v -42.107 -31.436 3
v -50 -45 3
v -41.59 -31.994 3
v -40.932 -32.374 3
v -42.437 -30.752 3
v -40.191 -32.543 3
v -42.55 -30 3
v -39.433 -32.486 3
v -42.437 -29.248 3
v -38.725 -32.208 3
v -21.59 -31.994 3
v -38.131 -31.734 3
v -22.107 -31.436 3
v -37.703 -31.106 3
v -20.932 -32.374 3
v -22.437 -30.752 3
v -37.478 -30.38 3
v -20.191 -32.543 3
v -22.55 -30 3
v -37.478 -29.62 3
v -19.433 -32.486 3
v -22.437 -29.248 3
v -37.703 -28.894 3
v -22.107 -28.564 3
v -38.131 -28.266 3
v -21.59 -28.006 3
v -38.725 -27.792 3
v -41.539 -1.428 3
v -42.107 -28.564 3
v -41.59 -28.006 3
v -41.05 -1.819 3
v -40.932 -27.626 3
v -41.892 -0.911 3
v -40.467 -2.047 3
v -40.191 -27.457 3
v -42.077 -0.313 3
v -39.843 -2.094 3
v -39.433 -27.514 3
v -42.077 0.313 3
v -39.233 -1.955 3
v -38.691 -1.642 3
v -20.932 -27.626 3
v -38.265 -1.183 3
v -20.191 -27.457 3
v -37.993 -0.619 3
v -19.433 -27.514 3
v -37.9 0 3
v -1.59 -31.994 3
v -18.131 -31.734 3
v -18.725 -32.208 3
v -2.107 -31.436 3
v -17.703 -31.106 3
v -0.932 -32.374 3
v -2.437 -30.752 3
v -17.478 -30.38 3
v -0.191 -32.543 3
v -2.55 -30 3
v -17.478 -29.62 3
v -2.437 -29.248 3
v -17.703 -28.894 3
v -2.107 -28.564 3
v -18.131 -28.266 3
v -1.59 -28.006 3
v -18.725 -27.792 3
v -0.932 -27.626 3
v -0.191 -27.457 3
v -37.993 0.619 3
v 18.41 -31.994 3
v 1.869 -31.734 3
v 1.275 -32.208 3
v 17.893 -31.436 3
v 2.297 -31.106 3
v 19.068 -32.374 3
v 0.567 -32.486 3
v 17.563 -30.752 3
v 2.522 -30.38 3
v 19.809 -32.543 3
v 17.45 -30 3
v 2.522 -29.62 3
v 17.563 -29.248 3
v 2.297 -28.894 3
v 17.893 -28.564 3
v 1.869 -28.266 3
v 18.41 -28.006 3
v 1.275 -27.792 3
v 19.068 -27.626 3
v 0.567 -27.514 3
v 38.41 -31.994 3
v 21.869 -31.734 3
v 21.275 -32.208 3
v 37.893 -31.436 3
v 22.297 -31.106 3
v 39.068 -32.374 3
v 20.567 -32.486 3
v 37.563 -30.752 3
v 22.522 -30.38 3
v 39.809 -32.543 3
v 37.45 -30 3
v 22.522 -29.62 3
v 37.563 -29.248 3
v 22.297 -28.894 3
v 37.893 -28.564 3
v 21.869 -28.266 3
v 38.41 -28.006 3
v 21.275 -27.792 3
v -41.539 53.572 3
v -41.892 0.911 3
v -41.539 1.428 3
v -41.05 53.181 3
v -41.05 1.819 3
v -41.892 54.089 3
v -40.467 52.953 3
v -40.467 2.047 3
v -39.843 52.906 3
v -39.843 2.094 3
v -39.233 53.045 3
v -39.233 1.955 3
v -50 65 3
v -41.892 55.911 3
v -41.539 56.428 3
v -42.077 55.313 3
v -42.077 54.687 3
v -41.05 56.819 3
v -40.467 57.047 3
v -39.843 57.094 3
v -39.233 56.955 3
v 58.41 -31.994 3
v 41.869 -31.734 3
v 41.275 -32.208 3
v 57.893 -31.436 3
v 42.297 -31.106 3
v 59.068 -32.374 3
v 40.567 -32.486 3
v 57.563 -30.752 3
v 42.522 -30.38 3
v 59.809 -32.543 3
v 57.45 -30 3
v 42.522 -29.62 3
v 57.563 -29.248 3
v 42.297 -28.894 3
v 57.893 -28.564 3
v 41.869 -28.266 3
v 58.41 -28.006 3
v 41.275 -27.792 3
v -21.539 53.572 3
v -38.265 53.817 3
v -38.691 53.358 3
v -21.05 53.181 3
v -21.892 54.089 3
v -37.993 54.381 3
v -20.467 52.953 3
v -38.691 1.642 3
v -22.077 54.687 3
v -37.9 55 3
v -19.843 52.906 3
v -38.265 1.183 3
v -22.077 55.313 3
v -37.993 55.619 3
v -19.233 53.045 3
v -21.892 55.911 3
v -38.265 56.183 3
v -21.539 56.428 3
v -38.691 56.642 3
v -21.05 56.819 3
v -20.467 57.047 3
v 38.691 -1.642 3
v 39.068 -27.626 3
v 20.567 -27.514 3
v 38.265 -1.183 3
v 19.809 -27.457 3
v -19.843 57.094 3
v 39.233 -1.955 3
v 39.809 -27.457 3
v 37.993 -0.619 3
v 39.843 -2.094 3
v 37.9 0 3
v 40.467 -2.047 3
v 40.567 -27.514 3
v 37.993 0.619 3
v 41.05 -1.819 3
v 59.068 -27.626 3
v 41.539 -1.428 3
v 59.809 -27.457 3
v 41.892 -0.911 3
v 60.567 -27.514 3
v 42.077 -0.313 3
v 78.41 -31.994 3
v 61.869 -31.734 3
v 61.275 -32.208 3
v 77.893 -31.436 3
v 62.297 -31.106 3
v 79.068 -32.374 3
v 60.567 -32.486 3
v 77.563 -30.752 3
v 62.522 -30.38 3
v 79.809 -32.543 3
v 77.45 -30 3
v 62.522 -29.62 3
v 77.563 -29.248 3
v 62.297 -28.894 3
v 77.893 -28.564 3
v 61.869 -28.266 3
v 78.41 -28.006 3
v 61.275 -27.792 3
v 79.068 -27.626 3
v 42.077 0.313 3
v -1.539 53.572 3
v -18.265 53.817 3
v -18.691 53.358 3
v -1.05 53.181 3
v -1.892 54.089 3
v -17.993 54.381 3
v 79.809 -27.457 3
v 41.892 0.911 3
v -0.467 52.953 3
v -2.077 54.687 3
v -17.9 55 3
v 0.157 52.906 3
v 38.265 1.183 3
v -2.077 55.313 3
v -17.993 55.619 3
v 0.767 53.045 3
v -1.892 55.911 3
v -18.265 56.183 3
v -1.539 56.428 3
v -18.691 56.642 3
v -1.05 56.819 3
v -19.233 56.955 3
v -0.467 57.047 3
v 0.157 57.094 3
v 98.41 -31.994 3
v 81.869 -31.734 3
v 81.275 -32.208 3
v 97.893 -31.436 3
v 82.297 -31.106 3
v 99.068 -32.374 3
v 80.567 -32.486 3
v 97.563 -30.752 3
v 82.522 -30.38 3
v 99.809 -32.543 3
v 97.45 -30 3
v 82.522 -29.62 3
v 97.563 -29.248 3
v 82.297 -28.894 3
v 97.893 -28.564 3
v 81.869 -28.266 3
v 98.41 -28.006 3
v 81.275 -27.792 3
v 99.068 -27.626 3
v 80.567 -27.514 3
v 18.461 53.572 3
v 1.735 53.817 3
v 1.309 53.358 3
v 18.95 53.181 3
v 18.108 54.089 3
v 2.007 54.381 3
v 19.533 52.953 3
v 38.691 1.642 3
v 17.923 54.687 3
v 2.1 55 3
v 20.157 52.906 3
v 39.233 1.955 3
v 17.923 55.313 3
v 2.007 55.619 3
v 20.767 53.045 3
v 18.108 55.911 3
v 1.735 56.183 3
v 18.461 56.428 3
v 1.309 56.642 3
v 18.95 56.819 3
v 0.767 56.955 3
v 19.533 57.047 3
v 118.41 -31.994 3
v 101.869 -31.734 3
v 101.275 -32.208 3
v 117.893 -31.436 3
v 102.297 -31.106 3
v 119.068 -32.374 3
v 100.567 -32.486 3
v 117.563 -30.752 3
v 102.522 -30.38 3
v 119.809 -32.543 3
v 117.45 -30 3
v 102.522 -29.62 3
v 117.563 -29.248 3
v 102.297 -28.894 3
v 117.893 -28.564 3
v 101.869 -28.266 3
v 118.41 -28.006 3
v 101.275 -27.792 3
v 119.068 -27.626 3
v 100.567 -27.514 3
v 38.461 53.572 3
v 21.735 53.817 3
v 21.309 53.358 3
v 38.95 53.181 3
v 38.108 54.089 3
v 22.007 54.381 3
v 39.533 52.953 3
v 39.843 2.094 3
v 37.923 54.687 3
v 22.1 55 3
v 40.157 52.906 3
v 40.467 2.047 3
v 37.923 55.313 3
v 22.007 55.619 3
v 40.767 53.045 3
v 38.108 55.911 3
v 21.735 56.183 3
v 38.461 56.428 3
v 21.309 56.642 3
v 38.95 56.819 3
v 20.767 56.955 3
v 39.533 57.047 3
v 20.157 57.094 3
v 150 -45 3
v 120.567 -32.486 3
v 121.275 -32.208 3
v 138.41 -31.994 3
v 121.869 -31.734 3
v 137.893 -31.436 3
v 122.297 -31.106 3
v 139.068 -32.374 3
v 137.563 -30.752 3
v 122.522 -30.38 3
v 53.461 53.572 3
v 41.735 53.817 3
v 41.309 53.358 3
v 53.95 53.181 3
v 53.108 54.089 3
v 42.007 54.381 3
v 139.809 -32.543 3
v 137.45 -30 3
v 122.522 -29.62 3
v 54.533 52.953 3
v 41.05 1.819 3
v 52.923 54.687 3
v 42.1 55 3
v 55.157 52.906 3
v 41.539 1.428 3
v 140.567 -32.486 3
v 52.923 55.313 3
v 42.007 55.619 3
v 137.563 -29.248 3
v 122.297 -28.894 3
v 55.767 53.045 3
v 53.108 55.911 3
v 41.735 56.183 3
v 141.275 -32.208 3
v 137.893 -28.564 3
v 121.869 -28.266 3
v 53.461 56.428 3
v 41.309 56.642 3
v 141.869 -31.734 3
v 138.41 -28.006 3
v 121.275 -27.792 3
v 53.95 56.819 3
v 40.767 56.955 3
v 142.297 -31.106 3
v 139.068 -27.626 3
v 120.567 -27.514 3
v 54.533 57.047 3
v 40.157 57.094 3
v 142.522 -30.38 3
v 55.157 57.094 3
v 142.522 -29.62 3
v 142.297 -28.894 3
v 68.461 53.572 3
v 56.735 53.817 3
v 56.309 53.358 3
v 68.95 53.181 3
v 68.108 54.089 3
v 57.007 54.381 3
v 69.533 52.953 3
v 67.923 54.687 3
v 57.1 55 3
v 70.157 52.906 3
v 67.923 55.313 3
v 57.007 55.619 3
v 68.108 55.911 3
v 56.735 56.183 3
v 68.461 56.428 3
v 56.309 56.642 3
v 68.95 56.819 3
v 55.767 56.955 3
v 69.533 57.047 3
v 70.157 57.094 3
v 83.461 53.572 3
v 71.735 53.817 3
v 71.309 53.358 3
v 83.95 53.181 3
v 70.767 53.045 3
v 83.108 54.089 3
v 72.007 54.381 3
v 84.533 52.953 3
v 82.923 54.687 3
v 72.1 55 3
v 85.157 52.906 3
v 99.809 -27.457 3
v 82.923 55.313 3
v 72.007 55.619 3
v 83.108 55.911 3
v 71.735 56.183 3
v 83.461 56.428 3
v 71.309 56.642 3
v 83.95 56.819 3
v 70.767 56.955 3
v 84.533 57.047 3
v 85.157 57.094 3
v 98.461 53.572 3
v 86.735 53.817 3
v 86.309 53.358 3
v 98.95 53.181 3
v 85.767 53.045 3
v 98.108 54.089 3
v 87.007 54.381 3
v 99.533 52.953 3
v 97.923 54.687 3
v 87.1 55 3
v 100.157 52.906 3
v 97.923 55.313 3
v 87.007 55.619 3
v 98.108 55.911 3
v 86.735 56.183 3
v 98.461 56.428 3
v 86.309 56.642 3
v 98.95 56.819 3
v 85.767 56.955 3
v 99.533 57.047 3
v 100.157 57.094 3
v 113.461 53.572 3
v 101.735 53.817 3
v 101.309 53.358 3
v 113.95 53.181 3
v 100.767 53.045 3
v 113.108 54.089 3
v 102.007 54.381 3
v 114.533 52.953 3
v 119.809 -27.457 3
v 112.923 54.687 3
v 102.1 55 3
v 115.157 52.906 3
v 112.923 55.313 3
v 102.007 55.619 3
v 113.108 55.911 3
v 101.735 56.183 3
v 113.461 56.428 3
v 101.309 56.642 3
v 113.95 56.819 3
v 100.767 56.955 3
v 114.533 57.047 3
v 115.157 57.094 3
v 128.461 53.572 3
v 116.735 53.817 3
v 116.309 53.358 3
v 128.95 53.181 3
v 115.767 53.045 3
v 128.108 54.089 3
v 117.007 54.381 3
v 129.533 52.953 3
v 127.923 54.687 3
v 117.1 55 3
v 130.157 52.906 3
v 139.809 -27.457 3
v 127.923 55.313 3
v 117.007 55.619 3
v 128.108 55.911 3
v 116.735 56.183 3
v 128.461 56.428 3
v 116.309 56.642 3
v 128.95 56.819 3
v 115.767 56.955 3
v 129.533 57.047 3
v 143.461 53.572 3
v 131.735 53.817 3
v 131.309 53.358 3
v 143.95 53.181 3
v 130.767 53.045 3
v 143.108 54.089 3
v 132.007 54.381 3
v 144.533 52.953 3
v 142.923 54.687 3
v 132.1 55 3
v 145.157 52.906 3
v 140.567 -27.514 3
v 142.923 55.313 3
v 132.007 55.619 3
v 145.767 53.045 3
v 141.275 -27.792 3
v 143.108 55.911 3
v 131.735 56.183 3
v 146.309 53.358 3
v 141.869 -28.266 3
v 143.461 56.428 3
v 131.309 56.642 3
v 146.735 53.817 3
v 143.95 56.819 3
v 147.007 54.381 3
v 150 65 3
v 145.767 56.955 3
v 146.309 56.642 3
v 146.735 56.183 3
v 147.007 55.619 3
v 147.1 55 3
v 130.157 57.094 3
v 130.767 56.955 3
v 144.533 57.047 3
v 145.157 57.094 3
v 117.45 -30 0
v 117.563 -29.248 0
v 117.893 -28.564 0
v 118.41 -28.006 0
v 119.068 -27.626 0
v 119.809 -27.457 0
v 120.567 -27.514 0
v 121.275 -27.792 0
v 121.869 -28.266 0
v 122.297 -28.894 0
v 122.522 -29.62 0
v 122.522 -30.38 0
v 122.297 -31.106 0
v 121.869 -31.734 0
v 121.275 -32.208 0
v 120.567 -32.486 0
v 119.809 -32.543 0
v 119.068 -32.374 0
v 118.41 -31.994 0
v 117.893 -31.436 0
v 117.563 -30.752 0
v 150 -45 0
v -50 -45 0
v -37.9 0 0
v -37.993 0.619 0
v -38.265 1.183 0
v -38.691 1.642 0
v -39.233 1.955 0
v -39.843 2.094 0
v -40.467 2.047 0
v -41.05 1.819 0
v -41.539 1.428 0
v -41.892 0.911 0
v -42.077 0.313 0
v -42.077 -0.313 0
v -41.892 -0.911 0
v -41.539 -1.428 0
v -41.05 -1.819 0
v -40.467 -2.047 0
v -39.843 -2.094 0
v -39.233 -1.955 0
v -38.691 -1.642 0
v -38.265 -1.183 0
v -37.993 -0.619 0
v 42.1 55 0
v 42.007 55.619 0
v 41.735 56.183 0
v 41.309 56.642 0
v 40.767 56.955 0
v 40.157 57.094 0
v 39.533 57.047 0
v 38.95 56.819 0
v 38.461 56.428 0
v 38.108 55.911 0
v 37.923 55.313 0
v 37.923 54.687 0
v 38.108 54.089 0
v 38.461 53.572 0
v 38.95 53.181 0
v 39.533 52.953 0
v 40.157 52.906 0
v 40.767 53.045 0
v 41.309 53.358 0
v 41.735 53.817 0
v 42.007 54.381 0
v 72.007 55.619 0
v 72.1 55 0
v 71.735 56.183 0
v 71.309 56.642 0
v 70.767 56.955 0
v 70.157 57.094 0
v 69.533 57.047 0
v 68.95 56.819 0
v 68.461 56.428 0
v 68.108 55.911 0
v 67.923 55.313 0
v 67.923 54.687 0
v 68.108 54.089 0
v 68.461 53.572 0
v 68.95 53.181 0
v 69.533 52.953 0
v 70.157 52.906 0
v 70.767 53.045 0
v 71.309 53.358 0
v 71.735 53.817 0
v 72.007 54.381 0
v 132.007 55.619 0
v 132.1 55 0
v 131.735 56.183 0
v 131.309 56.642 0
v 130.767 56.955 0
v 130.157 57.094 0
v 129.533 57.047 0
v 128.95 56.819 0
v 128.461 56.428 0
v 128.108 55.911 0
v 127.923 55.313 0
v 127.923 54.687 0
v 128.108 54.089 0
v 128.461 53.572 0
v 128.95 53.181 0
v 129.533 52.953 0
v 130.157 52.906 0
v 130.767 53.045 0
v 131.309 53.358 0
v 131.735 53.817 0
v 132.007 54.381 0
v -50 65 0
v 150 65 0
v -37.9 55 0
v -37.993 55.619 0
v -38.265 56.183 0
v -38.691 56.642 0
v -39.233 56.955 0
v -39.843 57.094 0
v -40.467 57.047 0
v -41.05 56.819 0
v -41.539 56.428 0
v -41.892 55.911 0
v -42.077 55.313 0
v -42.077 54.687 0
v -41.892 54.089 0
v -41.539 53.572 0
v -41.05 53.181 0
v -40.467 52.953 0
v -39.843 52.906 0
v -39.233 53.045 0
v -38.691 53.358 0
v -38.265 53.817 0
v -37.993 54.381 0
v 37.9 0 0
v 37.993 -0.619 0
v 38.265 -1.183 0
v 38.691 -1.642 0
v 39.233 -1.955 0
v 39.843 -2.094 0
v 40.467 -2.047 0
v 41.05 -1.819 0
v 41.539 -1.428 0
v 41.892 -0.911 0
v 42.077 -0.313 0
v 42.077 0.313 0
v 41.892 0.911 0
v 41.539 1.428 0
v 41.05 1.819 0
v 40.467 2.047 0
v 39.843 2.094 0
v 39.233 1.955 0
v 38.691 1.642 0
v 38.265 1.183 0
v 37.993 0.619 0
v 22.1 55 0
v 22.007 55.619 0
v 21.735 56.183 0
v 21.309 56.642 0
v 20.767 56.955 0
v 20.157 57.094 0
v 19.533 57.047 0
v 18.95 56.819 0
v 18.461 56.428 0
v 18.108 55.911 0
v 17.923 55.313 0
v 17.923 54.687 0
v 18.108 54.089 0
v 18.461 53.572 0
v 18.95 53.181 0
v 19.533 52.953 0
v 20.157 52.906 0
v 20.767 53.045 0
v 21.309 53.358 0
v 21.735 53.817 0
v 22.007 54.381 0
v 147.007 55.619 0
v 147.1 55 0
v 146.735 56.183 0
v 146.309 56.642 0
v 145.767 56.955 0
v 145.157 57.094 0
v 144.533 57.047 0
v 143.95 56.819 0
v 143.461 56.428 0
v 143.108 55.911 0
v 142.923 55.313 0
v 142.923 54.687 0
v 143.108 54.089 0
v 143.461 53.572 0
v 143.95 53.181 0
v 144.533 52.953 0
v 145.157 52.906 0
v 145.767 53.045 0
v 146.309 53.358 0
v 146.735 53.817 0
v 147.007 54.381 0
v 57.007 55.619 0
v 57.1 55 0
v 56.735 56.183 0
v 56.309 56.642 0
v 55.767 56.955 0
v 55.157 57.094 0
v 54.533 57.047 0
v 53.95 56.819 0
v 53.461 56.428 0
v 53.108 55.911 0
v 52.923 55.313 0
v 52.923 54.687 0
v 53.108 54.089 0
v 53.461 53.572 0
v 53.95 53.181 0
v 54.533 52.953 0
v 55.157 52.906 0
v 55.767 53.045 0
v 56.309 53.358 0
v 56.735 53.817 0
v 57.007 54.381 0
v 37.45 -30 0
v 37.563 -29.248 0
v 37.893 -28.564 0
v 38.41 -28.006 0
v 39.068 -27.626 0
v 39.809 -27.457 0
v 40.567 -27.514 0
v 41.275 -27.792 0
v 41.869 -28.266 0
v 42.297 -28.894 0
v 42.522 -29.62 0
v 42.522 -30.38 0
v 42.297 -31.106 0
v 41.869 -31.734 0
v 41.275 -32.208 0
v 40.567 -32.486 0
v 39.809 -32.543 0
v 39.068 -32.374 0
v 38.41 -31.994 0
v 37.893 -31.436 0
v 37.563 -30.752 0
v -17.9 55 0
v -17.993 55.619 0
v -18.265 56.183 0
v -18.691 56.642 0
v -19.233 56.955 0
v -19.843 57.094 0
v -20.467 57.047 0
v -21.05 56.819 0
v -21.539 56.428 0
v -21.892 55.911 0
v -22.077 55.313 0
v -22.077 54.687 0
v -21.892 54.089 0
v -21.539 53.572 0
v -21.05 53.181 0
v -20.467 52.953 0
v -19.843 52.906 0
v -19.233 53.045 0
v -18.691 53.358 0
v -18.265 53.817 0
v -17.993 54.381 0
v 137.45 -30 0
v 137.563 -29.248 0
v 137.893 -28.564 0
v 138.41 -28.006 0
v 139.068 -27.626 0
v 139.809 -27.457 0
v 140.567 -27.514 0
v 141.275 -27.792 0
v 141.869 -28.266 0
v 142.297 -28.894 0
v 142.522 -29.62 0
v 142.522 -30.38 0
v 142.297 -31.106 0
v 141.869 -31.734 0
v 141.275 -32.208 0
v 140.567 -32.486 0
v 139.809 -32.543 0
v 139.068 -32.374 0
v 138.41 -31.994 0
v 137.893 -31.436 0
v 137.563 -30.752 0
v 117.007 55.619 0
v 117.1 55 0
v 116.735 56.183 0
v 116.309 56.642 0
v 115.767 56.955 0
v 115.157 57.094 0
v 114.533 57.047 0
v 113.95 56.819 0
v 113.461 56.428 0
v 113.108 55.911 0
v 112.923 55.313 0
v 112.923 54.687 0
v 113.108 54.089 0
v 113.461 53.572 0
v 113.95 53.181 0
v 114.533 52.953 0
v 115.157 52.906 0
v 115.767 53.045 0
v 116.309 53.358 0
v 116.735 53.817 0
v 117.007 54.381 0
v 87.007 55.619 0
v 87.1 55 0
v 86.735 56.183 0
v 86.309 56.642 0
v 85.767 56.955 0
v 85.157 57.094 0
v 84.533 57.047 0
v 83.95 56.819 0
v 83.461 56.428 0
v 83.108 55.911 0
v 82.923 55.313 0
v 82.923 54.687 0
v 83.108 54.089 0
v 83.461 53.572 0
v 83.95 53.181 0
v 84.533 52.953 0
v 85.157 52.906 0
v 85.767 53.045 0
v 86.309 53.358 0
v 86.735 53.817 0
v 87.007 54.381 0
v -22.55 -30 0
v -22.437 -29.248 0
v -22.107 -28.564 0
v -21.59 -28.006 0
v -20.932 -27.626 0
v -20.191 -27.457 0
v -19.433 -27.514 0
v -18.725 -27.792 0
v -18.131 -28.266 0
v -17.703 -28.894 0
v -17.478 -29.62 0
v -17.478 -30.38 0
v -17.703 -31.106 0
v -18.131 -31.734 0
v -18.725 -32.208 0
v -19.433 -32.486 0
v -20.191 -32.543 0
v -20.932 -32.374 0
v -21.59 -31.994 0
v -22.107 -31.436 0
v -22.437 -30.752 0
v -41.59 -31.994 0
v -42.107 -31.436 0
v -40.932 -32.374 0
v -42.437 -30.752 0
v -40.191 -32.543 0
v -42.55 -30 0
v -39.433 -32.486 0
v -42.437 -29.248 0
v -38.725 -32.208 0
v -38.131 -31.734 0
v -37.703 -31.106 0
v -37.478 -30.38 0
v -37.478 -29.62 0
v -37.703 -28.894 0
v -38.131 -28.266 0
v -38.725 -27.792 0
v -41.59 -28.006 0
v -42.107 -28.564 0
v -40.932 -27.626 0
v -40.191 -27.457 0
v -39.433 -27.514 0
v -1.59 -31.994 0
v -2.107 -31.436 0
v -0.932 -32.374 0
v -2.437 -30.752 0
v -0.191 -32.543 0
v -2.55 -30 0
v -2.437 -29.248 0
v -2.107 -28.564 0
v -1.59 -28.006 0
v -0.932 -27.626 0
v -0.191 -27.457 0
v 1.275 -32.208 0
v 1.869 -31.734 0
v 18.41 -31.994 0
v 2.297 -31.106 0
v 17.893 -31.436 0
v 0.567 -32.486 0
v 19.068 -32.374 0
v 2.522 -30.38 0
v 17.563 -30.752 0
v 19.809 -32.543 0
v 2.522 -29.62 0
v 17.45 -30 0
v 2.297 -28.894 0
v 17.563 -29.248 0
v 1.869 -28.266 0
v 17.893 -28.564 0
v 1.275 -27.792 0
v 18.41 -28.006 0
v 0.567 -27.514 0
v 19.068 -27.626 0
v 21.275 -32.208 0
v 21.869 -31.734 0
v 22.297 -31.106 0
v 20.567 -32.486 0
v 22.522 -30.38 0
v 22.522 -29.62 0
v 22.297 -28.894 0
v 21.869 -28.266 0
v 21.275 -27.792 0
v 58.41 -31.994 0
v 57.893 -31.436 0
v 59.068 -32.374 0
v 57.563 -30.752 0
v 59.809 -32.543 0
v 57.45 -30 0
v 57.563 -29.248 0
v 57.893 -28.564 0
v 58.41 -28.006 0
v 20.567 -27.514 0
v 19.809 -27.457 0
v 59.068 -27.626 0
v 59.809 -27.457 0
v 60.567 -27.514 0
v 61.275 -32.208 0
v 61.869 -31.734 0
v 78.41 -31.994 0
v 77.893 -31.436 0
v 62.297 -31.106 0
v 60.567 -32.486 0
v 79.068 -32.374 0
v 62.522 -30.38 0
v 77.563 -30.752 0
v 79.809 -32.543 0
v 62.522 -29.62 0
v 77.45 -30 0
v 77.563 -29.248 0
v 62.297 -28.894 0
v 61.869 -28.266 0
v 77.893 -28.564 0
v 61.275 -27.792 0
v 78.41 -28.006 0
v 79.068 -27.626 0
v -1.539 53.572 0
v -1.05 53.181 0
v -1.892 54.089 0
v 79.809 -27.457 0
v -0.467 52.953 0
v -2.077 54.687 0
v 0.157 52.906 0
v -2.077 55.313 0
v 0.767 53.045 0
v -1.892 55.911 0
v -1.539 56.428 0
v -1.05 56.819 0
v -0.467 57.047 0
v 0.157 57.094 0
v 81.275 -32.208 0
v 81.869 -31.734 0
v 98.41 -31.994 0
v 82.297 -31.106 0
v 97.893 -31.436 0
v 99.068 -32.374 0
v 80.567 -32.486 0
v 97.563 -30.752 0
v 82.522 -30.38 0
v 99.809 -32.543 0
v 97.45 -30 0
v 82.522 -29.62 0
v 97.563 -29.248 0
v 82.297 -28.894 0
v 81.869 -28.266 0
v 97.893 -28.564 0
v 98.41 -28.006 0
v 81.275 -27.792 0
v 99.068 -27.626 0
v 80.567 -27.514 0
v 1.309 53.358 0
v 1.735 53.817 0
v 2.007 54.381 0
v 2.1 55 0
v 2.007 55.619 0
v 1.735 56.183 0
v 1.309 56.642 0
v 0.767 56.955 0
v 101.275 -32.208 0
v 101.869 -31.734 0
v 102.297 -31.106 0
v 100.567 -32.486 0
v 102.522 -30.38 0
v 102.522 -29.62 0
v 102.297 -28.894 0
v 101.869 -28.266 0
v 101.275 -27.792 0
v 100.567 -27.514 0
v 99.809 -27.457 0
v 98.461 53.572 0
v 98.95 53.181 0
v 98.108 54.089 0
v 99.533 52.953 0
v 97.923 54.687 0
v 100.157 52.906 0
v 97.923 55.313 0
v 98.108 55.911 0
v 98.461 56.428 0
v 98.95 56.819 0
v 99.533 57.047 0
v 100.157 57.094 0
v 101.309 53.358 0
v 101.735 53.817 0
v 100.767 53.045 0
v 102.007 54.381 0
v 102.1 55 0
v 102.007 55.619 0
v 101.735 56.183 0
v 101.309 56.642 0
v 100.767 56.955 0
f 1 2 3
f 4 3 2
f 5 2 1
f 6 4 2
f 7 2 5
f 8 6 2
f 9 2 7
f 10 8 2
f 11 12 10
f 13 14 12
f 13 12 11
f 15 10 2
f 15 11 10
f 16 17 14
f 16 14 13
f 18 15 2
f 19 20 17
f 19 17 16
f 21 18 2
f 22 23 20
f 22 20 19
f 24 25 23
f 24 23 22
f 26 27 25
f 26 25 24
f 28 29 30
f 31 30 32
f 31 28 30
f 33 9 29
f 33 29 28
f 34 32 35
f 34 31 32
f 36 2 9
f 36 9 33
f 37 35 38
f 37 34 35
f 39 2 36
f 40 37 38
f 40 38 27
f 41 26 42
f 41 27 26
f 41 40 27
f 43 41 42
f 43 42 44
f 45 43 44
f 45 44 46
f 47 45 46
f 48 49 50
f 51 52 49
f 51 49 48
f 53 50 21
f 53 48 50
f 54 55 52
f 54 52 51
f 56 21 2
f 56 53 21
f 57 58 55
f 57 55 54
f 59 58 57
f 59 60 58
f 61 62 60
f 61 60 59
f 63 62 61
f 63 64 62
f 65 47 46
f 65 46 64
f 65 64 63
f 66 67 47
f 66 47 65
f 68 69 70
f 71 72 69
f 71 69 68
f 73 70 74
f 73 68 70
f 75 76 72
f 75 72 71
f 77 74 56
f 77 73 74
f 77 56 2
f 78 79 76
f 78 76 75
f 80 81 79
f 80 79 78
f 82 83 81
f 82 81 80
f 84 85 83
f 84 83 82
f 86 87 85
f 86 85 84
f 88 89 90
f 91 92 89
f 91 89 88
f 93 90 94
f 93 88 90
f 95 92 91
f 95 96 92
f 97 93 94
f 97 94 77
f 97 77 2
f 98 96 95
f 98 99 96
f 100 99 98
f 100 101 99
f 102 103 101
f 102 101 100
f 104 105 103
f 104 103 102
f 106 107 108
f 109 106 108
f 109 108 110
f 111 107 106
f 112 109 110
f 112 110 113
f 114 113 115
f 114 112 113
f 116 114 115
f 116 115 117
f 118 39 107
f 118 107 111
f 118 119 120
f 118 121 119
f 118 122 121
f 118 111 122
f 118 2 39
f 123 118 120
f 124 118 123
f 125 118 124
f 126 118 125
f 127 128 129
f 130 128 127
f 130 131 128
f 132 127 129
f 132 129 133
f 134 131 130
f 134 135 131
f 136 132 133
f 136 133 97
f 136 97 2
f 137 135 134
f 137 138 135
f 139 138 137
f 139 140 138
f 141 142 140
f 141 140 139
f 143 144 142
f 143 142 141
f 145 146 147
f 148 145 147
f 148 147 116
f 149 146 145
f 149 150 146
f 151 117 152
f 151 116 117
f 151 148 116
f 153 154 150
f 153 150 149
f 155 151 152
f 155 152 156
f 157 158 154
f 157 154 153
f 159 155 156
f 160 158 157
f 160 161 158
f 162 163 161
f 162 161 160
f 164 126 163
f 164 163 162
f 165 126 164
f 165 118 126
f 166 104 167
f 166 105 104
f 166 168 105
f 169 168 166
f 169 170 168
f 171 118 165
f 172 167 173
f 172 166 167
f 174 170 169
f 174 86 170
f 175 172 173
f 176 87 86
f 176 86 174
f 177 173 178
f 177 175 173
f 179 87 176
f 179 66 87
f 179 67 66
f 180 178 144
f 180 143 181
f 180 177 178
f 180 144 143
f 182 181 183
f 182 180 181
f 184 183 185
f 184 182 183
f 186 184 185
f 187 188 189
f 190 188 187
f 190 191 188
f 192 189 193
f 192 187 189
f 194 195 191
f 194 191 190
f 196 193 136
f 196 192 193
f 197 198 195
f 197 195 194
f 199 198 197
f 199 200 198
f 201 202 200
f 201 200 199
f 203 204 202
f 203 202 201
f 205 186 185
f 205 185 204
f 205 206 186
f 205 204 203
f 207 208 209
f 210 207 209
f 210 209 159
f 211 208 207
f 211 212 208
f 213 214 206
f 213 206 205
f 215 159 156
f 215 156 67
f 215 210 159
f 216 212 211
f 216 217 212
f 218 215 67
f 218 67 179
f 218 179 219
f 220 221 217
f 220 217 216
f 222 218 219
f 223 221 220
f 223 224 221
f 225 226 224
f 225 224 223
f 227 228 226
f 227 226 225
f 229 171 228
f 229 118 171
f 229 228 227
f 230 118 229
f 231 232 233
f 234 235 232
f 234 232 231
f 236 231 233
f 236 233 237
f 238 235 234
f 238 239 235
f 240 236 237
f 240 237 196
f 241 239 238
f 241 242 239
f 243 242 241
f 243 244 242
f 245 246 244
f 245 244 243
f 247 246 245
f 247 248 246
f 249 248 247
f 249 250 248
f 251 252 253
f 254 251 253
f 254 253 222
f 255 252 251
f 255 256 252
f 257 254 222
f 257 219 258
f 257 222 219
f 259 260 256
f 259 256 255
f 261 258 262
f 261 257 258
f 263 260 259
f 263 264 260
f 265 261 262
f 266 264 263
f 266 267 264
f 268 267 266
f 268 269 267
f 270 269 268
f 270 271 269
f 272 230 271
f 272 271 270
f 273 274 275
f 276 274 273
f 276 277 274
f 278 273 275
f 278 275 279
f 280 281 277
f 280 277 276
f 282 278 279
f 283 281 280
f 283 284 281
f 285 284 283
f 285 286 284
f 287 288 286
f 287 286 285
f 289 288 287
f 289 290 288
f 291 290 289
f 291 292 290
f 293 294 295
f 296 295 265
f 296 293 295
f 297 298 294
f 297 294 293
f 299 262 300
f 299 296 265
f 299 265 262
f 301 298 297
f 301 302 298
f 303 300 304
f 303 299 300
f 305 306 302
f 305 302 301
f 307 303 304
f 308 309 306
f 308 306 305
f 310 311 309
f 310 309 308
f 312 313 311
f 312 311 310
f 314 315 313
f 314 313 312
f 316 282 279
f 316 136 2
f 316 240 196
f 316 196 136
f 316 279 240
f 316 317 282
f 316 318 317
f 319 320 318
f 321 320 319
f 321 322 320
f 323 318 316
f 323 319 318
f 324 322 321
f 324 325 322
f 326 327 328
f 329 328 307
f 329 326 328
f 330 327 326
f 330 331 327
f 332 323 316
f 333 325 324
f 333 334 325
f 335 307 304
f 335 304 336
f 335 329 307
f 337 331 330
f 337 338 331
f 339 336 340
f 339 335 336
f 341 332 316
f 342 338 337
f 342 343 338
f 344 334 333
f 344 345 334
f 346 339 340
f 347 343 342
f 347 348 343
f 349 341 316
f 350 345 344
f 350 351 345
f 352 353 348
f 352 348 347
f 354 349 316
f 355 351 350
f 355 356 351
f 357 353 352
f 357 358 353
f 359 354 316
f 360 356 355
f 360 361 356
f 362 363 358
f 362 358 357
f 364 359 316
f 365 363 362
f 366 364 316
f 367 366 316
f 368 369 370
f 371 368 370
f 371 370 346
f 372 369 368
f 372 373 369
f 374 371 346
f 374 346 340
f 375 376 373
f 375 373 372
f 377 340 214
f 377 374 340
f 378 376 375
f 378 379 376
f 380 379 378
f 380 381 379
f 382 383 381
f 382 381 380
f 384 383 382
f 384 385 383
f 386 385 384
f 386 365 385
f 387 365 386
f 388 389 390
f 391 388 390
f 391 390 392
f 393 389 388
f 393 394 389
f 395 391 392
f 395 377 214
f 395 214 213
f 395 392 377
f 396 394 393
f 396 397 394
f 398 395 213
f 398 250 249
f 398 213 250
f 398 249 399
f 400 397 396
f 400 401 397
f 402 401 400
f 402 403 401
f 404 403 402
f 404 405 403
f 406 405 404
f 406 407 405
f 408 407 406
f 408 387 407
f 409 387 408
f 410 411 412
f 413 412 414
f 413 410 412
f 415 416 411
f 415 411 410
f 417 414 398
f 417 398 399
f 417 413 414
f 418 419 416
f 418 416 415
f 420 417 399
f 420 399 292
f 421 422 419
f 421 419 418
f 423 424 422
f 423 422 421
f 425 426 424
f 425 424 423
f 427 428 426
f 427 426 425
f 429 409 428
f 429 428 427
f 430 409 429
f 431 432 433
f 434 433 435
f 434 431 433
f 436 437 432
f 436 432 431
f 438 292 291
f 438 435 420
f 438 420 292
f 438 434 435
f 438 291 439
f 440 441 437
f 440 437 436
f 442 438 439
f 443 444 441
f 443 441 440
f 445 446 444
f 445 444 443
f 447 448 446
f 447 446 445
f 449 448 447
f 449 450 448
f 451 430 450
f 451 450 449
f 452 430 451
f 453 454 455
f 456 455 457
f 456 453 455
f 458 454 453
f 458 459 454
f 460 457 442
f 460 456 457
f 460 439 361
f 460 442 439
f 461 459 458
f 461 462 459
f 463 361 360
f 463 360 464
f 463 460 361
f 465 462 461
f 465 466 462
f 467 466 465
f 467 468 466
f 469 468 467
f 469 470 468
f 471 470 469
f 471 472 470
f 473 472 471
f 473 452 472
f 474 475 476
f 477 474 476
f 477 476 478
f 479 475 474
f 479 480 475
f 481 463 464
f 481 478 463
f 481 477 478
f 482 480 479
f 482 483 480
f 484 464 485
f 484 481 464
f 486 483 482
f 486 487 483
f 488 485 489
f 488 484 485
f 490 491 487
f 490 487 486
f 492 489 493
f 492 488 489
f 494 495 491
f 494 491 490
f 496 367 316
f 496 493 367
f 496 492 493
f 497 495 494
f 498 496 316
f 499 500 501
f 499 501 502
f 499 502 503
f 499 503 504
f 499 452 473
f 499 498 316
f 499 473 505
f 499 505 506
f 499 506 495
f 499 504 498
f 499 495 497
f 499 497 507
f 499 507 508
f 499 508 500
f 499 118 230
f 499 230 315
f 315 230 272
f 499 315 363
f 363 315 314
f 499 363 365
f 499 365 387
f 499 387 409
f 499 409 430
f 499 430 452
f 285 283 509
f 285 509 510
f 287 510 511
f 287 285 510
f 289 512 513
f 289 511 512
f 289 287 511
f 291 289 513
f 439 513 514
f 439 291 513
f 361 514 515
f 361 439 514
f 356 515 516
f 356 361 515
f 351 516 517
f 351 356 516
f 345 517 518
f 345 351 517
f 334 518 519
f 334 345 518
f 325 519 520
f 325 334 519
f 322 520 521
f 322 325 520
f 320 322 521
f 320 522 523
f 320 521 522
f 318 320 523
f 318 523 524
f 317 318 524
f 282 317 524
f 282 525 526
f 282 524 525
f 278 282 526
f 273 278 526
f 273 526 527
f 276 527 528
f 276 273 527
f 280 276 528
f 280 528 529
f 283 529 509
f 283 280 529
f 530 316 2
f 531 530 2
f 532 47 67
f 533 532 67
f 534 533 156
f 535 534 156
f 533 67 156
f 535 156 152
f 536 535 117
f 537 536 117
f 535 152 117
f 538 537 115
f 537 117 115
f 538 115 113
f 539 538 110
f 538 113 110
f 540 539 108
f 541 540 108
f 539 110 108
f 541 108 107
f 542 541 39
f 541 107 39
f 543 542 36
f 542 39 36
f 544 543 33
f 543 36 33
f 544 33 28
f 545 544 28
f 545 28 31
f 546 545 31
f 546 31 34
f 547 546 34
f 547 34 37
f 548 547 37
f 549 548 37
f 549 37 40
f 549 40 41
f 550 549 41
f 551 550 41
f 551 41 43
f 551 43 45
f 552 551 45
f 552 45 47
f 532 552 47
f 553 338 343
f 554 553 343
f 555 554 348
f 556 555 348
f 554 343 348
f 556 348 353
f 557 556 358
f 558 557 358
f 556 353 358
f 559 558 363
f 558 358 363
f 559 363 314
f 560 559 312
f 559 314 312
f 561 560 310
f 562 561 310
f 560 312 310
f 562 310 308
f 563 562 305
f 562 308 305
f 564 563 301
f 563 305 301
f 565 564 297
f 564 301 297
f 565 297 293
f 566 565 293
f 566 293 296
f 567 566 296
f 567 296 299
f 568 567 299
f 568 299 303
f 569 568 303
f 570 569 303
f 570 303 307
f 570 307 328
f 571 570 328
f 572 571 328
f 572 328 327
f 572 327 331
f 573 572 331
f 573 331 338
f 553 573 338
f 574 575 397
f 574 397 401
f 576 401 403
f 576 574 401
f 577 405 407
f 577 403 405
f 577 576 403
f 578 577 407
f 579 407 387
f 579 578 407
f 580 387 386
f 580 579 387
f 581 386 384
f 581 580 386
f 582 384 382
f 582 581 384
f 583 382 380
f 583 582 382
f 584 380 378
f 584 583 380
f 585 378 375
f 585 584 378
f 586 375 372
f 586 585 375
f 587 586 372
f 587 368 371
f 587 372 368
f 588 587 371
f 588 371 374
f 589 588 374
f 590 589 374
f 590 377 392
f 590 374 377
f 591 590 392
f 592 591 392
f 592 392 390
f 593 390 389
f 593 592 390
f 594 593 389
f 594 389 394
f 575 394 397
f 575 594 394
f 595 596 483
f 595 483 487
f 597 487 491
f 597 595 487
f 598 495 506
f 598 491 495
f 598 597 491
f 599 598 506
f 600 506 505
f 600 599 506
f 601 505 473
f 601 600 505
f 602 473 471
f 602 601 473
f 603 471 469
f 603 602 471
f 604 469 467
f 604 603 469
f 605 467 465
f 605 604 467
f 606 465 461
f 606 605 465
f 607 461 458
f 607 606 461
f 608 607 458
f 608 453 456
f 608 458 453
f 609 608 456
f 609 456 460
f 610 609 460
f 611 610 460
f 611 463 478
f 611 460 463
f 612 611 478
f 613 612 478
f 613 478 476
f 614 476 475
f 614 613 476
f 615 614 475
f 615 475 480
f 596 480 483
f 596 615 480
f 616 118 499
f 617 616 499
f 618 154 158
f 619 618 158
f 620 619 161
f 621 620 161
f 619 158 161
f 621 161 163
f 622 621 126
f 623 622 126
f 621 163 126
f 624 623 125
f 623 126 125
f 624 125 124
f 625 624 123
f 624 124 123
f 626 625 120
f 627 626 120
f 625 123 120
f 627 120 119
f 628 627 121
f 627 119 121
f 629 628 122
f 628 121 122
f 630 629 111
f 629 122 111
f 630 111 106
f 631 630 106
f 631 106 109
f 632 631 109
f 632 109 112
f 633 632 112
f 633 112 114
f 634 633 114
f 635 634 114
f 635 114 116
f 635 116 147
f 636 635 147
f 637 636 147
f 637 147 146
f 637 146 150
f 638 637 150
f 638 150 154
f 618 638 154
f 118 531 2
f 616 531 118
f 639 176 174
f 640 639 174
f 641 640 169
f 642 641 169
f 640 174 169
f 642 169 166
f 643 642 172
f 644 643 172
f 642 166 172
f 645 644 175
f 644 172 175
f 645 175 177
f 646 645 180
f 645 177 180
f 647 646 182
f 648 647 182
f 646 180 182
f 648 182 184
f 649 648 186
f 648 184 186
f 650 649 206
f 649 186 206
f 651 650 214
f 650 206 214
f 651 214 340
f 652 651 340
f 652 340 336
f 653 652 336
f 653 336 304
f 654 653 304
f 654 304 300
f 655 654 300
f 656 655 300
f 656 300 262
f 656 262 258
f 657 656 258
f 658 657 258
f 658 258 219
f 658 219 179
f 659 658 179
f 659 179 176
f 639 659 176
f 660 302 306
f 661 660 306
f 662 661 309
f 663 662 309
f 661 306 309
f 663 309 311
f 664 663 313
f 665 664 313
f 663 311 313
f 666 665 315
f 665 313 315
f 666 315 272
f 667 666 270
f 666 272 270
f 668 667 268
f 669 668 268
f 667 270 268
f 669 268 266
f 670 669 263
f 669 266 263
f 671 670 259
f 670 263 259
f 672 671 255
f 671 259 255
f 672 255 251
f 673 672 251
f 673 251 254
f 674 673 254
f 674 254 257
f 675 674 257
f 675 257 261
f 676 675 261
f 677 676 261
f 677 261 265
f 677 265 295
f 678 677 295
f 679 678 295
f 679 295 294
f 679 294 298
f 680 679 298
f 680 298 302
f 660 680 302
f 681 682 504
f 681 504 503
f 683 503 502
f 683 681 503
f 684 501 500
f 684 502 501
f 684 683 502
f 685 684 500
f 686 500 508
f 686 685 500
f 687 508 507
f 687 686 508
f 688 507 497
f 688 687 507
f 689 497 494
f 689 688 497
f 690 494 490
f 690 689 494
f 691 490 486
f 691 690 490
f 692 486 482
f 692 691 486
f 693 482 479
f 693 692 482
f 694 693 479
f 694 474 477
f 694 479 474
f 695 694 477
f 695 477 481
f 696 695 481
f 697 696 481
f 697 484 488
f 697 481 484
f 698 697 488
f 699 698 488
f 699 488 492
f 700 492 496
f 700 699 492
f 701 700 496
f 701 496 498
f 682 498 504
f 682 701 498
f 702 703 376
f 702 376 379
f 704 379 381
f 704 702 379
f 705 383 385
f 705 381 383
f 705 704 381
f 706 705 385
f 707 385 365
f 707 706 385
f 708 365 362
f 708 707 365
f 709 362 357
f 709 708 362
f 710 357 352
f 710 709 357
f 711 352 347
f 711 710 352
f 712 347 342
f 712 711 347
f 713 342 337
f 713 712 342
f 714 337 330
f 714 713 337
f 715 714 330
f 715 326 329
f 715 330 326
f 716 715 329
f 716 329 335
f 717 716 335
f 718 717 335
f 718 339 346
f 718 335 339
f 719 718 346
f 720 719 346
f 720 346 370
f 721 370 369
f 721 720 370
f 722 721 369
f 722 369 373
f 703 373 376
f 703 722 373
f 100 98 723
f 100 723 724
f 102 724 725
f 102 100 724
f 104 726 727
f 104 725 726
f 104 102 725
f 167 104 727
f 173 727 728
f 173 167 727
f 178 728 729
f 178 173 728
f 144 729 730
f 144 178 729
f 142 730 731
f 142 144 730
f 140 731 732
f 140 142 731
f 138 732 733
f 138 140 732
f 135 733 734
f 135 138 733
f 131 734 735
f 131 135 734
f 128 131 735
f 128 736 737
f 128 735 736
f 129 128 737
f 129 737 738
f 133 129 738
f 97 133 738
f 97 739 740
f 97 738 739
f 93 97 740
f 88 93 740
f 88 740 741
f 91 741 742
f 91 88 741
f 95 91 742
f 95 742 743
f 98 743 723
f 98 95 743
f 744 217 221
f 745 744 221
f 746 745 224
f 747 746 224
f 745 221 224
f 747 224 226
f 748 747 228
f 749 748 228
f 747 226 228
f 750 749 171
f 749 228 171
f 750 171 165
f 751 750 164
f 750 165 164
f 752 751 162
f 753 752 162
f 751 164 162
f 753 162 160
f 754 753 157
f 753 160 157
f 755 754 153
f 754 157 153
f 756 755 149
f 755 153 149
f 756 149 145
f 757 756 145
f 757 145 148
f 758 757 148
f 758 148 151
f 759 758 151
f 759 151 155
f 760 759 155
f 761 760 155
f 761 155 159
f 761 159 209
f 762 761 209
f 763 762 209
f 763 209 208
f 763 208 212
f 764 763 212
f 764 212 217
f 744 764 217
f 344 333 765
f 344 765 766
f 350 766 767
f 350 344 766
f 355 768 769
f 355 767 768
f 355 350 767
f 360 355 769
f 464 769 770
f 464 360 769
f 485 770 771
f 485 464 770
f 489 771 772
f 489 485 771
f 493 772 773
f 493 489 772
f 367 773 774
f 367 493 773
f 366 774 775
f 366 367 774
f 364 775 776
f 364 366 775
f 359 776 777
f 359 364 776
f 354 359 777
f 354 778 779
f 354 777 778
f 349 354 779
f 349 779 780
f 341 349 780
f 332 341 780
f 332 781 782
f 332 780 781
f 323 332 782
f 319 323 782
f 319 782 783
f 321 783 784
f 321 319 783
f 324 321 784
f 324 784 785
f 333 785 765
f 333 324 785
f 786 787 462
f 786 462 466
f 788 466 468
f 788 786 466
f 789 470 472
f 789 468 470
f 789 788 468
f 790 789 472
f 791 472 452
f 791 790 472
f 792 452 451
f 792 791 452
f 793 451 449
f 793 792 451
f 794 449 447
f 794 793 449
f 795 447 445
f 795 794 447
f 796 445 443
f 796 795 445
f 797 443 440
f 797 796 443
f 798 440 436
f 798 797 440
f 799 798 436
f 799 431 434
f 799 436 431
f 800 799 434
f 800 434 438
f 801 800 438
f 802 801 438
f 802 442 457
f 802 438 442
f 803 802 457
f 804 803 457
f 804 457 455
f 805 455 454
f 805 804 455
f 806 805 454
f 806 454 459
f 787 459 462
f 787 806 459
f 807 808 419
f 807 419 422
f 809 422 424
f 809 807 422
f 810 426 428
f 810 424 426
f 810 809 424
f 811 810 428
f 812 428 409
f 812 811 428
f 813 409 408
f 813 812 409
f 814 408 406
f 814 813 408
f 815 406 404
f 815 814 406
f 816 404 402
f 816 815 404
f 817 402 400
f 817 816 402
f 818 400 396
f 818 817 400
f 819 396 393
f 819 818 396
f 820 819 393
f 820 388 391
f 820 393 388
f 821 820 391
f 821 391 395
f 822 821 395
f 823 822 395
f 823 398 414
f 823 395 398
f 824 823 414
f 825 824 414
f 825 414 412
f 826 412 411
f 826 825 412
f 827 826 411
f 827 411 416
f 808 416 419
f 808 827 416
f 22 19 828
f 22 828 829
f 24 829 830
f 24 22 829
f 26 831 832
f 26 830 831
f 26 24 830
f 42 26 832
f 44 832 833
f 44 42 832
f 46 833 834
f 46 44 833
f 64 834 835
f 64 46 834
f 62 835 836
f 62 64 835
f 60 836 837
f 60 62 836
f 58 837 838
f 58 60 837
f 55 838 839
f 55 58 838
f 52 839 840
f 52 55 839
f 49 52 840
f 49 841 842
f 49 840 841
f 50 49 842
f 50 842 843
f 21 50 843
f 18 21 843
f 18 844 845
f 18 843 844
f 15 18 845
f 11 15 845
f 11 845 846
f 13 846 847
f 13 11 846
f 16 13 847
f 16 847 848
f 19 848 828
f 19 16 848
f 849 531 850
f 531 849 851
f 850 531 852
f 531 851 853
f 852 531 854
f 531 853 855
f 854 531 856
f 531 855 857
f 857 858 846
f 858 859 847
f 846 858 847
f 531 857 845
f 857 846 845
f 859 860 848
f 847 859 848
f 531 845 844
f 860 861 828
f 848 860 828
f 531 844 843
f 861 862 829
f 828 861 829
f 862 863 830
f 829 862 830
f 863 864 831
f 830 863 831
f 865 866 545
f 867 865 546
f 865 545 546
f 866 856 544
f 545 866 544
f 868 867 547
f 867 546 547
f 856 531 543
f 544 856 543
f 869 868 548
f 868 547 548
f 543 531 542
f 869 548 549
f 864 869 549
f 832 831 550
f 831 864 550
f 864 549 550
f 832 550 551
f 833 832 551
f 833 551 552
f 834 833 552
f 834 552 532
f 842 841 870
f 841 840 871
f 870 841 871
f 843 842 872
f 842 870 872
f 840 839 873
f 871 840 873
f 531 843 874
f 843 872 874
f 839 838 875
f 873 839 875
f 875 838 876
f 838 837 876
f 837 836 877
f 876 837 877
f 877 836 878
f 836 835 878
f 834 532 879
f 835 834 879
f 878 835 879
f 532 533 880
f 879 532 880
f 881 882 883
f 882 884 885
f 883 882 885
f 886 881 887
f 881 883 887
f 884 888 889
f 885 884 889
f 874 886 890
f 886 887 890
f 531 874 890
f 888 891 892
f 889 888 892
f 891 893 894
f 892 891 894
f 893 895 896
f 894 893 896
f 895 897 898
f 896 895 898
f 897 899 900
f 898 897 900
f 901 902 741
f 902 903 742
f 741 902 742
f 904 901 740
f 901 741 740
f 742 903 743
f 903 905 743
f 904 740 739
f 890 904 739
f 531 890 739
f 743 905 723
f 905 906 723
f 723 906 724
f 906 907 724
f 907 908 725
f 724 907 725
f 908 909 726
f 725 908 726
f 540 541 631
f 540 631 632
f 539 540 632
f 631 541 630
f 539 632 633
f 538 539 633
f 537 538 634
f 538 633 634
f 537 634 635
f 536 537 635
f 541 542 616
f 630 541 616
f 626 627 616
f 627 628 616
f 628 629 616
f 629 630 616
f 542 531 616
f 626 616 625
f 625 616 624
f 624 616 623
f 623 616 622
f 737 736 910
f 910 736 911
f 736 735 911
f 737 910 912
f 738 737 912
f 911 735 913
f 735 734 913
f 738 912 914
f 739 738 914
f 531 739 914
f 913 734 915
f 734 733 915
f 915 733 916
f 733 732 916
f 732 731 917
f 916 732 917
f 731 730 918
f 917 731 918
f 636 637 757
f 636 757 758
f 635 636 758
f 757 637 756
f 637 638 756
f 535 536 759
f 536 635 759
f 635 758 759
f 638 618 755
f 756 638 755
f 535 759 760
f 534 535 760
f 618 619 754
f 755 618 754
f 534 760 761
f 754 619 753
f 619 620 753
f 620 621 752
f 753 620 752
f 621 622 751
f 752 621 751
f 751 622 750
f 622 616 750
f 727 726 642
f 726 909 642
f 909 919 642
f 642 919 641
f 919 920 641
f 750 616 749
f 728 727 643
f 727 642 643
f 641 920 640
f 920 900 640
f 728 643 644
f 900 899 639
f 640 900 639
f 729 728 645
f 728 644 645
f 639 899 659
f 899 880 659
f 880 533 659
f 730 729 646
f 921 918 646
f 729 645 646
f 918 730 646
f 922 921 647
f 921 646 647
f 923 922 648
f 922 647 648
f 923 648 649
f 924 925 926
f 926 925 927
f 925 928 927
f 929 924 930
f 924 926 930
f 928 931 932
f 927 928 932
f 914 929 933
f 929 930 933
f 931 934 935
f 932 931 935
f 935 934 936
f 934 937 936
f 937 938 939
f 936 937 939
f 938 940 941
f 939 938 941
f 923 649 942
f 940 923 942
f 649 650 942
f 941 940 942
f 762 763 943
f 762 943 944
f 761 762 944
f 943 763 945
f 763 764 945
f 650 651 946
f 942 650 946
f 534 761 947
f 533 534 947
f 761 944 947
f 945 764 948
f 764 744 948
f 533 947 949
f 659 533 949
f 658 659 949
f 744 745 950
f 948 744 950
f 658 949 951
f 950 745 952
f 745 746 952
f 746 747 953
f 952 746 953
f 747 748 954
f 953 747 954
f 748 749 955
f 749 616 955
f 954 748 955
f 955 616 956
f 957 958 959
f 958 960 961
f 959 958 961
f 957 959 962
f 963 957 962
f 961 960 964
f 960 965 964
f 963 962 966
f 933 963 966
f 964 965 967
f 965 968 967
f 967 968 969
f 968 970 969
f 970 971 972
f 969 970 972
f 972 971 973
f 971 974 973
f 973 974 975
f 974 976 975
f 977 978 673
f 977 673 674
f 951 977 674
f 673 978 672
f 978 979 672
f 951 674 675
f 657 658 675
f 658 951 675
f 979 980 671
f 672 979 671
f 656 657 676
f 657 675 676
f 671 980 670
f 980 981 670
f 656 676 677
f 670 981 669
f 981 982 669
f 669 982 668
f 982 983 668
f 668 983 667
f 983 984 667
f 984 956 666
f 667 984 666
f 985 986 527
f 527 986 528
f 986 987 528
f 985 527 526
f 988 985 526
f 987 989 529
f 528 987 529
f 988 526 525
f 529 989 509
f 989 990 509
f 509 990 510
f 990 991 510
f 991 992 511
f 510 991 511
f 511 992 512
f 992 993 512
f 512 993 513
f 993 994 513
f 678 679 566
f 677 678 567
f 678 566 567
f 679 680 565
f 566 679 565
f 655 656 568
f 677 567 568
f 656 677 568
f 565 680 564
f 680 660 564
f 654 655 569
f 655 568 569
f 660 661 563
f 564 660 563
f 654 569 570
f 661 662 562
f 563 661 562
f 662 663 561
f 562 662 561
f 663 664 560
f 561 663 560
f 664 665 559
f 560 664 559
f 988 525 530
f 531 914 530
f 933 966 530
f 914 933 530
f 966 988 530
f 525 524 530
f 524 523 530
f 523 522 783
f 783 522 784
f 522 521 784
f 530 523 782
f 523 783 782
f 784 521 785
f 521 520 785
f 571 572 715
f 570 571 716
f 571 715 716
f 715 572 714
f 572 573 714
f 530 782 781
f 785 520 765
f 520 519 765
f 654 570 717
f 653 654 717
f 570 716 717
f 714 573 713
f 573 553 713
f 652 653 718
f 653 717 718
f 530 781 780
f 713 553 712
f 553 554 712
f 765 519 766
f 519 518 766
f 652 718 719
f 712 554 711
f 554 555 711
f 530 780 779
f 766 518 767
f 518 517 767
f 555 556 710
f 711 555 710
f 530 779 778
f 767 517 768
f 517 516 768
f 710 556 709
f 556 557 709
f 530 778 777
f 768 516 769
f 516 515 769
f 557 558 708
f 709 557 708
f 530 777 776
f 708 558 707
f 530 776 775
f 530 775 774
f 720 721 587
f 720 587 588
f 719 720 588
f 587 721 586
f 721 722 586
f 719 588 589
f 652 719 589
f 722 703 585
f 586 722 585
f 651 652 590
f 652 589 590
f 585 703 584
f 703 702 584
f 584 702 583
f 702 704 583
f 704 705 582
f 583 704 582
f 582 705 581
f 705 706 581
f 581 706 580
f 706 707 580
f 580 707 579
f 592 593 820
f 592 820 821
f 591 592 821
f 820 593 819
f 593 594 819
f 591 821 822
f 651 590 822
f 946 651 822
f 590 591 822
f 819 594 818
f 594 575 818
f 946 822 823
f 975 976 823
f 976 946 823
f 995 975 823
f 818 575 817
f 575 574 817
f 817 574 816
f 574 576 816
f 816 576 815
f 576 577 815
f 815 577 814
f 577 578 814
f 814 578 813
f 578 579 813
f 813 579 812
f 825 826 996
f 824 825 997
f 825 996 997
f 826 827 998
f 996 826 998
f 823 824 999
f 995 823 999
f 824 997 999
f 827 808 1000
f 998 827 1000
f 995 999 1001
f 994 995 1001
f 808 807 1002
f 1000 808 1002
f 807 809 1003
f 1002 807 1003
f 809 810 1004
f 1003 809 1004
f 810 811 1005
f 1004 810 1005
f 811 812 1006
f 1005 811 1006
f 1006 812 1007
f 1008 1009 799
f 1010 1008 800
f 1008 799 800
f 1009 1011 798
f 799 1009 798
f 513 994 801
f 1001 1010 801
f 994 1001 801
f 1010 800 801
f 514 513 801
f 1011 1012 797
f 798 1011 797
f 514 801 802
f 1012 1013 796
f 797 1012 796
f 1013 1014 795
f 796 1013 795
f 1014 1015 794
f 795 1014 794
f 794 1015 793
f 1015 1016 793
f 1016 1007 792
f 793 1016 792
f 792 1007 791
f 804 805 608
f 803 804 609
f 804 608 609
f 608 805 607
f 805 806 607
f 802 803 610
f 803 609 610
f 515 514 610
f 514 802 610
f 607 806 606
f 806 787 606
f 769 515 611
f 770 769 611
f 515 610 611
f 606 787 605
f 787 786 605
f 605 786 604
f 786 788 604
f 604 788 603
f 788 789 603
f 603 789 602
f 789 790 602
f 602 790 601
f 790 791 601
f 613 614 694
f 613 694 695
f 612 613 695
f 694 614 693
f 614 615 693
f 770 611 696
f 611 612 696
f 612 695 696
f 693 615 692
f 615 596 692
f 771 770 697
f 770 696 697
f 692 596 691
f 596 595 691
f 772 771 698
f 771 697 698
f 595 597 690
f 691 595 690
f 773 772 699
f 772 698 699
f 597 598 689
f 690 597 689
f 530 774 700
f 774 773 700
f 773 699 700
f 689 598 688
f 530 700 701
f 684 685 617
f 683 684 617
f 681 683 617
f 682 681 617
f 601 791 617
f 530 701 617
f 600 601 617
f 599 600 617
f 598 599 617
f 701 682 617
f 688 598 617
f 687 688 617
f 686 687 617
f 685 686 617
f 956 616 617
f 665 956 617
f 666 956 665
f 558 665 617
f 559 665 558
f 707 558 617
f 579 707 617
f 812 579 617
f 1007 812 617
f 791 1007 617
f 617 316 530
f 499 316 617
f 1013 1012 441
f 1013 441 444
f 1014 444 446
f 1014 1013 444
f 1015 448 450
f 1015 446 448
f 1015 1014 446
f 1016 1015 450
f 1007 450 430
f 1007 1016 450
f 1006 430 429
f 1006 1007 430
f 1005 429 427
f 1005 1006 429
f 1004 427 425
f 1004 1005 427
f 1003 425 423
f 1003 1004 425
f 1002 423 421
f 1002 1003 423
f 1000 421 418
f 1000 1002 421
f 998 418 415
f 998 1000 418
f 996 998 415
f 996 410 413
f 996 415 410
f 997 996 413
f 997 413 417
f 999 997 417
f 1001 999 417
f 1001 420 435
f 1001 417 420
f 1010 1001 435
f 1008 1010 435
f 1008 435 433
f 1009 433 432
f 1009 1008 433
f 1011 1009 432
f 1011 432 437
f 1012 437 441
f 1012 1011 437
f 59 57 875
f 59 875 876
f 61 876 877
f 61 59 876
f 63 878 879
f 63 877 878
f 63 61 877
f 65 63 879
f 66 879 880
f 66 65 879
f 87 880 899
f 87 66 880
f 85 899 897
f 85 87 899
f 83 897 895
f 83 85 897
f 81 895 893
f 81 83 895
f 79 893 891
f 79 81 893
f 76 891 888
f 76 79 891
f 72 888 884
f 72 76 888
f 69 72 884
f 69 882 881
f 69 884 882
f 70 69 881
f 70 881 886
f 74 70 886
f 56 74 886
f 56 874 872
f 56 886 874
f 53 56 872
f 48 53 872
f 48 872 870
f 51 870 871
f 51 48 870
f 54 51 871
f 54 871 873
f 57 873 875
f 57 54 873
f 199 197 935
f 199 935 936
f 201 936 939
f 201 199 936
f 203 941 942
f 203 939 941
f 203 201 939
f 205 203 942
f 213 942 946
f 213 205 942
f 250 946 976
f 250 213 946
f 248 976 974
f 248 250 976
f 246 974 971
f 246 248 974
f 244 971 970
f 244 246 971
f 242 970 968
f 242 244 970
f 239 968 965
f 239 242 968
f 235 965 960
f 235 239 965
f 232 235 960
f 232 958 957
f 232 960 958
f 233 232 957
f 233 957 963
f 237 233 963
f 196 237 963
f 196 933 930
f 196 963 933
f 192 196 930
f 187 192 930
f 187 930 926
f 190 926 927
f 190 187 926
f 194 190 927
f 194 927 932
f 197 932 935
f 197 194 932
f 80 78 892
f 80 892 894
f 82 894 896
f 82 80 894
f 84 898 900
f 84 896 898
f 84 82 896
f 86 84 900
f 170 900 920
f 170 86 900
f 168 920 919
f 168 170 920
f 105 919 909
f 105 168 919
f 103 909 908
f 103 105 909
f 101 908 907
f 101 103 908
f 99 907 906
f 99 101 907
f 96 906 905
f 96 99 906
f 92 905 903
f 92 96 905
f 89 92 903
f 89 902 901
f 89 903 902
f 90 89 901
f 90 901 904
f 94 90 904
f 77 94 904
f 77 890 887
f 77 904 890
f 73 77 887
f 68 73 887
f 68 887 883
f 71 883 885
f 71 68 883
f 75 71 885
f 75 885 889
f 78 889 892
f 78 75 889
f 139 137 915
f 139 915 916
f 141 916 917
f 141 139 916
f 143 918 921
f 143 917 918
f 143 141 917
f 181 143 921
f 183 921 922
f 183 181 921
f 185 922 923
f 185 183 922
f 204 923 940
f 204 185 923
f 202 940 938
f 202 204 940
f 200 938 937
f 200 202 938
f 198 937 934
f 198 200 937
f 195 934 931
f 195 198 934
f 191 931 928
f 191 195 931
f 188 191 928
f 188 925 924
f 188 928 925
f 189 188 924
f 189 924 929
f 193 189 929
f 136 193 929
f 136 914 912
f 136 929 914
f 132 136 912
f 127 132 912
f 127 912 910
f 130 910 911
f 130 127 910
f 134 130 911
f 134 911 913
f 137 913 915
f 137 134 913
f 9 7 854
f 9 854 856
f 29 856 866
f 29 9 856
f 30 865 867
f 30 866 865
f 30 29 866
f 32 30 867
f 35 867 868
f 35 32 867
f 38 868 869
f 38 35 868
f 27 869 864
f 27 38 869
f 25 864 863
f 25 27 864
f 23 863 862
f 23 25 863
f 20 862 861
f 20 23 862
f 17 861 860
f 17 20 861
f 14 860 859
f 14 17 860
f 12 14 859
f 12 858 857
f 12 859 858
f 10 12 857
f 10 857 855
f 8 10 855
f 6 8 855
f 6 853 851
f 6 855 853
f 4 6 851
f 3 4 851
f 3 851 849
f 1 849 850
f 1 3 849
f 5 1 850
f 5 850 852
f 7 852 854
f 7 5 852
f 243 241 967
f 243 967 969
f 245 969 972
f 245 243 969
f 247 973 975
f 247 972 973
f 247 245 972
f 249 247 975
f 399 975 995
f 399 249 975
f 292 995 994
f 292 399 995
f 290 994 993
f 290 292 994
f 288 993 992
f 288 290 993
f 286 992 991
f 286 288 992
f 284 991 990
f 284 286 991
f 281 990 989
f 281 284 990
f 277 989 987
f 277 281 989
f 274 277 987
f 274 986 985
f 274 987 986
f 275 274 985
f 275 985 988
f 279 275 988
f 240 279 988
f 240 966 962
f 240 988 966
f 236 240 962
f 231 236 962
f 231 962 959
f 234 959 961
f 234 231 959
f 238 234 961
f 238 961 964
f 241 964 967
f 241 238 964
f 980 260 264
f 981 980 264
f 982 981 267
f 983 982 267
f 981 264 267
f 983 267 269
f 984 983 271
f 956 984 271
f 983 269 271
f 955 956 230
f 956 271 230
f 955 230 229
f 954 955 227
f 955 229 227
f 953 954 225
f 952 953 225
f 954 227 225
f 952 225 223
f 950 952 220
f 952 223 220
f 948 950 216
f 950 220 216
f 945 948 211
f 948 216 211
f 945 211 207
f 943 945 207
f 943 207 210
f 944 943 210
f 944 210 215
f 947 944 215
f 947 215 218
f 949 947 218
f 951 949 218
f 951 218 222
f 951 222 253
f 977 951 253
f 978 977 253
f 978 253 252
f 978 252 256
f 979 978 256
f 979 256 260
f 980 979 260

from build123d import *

# Parameters (mm, degrees)
SKETCH_1_W               = 100
SKETCH_1_H               = 130
EXTRUDE_1_DEPTH          = 3
SKETCH_2_R               = 2.1
CUT_EXTRUDE_1_DEPTH      = 83.060952956
SKETCH_5_W               = 100
SKETCH_5_H               = 130
EXTRUDE_2_DEPTH          = 3
CUT_EXTRUDE_4_DEPTH      = 164.505351594
CUT_EXTRUDE_4_DEPTH_BACK = 164.505351594
SKETCH_6_R               = 2.1
CUT_EXTRUDE_5_DEPTH      = 164.505351594
CUT_EXTRUDE_5_DEPTH_BACK = 164.505351594
SKETCH_7_R               = 2.55
CUT_EXTRUDE_6_DEPTH      = 164.505351594
CUT_EXTRUDE_6_DEPTH_BACK = 164.505351594
SKETCH_8_W               = 200
SKETCH_8_H               = 20


with BuildPart() as part:
    # 草图1 → 凸台-拉伸1 (new body)
    with BuildSketch(Plane.XY):
        Rectangle(SKETCH_1_W, SKETCH_1_H)
    extrude(amount=EXTRUDE_1_DEPTH)

    # 草图2 → 切除-拉伸1 (cut, through all)
    with BuildSketch(Plane.XY.offset(3)):
        with Locations((-40, 55)):
            Circle(SKETCH_2_R)
        with Locations((-20, 55)):
            Circle(SKETCH_2_R)
        with Locations((0, 55)):
            Circle(SKETCH_2_R)
        with Locations((20, 55)):
            Circle(SKETCH_2_R)
        with Locations((40, 55)):
            Circle(SKETCH_2_R)
        with Locations((-40, 0)):
            Circle(SKETCH_2_R)
        with Locations((-40, -55)):
            Circle(SKETCH_2_R)
        with Locations((-40, -110)):
            Circle(SKETCH_2_R)
        with Locations((-40, -165)):
            Circle(SKETCH_2_R)
        with Locations((-40, -220)):
            Circle(SKETCH_2_R)
        with Locations((-40, -275)):
            Circle(SKETCH_2_R)
        with Locations((-40, -330)):
            Circle(SKETCH_2_R)
        with Locations((-40, -385)):
            Circle(SKETCH_2_R)
        with Locations((40, -385)):
            Circle(SKETCH_2_R)
        with Locations((40, -330)):
            Circle(SKETCH_2_R)
        with Locations((40, -275)):
            Circle(SKETCH_2_R)
        with Locations((40, -220)):
            Circle(SKETCH_2_R)
        with Locations((40, -165)):
            Circle(SKETCH_2_R)
        with Locations((40, -110)):
            Circle(SKETCH_2_R)
        with Locations(Location((40, -55, 0), (0, 0, 180))):
            Circle(SKETCH_2_R)
        with Locations(Location((40, 0, 0), (0, 0, 180))):
            Circle(SKETCH_2_R)
        with Locations(Location((20, -55, 0), (0, 0, 180))):
            Circle(SKETCH_2_R)
        with Locations(Location((0, -55, 0), (0, 0, 180))):
            Circle(SKETCH_2_R)
        with Locations(Location((-20, -55, 0), (0, 0, 180))):
            Circle(SKETCH_2_R)
    extrude(amount=-CUT_EXTRUDE_1_DEPTH, mode=Mode.SUBTRACT)

    # 草图5 → 凸台-拉伸2 (add)
    with BuildSketch(Plane.XY.offset(3)):
        with Locations((100, 0)):
            Rectangle(SKETCH_5_W, SKETCH_5_H)
    extrude(amount=-EXTRUDE_2_DEPTH)

    # 草图6 → 切除-拉伸4 (cut, two sides: drawn at the far end of the back side and taken through both)
    with BuildSketch(Plane.XY.offset(3).offset(-CUT_EXTRUDE_4_DEPTH_BACK)):
        with Locations((55, 55)):
            Circle(SKETCH_6_R)
        with Locations((70, 55)):
            Circle(SKETCH_6_R)
        with Locations((85, 55)):
            Circle(SKETCH_6_R)
        with Locations((100, 55)):
            Circle(SKETCH_6_R)
        with Locations((115, 55)):
            Circle(SKETCH_6_R)
        with Locations((130, 55)):
            Circle(SKETCH_6_R)
        with Locations((145, 55)):
            Circle(SKETCH_6_R)
        with Locations((145, -55)):
            Circle(SKETCH_6_R)
        with Locations((130, -55)):
            Circle(SKETCH_6_R)
        with Locations((115, -55)):
            Circle(SKETCH_6_R)
        with Locations((100, -55)):
            Circle(SKETCH_6_R)
        with Locations((85, -55)):
            Circle(SKETCH_6_R)
        with Locations((70, -55)):
            Circle(SKETCH_6_R)
        with Locations((55, -55)):
            Circle(SKETCH_6_R)
    extrude(amount=CUT_EXTRUDE_4_DEPTH + CUT_EXTRUDE_4_DEPTH_BACK, mode=Mode.SUBTRACT)

    # 草图7 → 切除-拉伸5 (cut, two sides: drawn at the far end of the back side and taken through both)
    with BuildSketch(Plane(origin=(0, 0, 0), x_dir=(-1, 0, 0), z_dir=(0, 0, -1)).offset(-CUT_EXTRUDE_5_DEPTH_BACK)):
        with Locations((-140, -30)):
            Circle(SKETCH_7_R)
        with Locations((-120, -30)):
            Circle(SKETCH_7_R)
        with Locations((-100, -30)):
            Circle(SKETCH_7_R)
        with Locations((-80, -30)):
            Circle(SKETCH_7_R)
        with Locations((-60, -30)):
            Circle(SKETCH_7_R)
        with Locations((-40, -30)):
            Circle(SKETCH_7_R)
        with Locations((-20, -30)):
            Circle(SKETCH_7_R)
        with Locations((0, -30)):
            Circle(SKETCH_7_R)
        with Locations((20, -30)):
            Circle(SKETCH_7_R)
        with Locations((40, -30)):
            Circle(SKETCH_7_R)
    extrude(amount=CUT_EXTRUDE_5_DEPTH + CUT_EXTRUDE_5_DEPTH_BACK, mode=Mode.SUBTRACT)

    # 草图8 → 切除-拉伸6 (cut, two sides: drawn at the far end of the back side and taken through both)
    with BuildSketch(Plane(origin=(0, 0, 0), x_dir=(-1, 0, 0), z_dir=(0, 0, -1)).offset(-CUT_EXTRUDE_6_DEPTH_BACK)):
        with Locations((-50, -55)):
            Rectangle(SKETCH_8_W, SKETCH_8_H)
    extrude(amount=CUT_EXTRUDE_6_DEPTH + CUT_EXTRUDE_6_DEPTH_BACK, mode=Mode.SUBTRACT)


solid = part.part
